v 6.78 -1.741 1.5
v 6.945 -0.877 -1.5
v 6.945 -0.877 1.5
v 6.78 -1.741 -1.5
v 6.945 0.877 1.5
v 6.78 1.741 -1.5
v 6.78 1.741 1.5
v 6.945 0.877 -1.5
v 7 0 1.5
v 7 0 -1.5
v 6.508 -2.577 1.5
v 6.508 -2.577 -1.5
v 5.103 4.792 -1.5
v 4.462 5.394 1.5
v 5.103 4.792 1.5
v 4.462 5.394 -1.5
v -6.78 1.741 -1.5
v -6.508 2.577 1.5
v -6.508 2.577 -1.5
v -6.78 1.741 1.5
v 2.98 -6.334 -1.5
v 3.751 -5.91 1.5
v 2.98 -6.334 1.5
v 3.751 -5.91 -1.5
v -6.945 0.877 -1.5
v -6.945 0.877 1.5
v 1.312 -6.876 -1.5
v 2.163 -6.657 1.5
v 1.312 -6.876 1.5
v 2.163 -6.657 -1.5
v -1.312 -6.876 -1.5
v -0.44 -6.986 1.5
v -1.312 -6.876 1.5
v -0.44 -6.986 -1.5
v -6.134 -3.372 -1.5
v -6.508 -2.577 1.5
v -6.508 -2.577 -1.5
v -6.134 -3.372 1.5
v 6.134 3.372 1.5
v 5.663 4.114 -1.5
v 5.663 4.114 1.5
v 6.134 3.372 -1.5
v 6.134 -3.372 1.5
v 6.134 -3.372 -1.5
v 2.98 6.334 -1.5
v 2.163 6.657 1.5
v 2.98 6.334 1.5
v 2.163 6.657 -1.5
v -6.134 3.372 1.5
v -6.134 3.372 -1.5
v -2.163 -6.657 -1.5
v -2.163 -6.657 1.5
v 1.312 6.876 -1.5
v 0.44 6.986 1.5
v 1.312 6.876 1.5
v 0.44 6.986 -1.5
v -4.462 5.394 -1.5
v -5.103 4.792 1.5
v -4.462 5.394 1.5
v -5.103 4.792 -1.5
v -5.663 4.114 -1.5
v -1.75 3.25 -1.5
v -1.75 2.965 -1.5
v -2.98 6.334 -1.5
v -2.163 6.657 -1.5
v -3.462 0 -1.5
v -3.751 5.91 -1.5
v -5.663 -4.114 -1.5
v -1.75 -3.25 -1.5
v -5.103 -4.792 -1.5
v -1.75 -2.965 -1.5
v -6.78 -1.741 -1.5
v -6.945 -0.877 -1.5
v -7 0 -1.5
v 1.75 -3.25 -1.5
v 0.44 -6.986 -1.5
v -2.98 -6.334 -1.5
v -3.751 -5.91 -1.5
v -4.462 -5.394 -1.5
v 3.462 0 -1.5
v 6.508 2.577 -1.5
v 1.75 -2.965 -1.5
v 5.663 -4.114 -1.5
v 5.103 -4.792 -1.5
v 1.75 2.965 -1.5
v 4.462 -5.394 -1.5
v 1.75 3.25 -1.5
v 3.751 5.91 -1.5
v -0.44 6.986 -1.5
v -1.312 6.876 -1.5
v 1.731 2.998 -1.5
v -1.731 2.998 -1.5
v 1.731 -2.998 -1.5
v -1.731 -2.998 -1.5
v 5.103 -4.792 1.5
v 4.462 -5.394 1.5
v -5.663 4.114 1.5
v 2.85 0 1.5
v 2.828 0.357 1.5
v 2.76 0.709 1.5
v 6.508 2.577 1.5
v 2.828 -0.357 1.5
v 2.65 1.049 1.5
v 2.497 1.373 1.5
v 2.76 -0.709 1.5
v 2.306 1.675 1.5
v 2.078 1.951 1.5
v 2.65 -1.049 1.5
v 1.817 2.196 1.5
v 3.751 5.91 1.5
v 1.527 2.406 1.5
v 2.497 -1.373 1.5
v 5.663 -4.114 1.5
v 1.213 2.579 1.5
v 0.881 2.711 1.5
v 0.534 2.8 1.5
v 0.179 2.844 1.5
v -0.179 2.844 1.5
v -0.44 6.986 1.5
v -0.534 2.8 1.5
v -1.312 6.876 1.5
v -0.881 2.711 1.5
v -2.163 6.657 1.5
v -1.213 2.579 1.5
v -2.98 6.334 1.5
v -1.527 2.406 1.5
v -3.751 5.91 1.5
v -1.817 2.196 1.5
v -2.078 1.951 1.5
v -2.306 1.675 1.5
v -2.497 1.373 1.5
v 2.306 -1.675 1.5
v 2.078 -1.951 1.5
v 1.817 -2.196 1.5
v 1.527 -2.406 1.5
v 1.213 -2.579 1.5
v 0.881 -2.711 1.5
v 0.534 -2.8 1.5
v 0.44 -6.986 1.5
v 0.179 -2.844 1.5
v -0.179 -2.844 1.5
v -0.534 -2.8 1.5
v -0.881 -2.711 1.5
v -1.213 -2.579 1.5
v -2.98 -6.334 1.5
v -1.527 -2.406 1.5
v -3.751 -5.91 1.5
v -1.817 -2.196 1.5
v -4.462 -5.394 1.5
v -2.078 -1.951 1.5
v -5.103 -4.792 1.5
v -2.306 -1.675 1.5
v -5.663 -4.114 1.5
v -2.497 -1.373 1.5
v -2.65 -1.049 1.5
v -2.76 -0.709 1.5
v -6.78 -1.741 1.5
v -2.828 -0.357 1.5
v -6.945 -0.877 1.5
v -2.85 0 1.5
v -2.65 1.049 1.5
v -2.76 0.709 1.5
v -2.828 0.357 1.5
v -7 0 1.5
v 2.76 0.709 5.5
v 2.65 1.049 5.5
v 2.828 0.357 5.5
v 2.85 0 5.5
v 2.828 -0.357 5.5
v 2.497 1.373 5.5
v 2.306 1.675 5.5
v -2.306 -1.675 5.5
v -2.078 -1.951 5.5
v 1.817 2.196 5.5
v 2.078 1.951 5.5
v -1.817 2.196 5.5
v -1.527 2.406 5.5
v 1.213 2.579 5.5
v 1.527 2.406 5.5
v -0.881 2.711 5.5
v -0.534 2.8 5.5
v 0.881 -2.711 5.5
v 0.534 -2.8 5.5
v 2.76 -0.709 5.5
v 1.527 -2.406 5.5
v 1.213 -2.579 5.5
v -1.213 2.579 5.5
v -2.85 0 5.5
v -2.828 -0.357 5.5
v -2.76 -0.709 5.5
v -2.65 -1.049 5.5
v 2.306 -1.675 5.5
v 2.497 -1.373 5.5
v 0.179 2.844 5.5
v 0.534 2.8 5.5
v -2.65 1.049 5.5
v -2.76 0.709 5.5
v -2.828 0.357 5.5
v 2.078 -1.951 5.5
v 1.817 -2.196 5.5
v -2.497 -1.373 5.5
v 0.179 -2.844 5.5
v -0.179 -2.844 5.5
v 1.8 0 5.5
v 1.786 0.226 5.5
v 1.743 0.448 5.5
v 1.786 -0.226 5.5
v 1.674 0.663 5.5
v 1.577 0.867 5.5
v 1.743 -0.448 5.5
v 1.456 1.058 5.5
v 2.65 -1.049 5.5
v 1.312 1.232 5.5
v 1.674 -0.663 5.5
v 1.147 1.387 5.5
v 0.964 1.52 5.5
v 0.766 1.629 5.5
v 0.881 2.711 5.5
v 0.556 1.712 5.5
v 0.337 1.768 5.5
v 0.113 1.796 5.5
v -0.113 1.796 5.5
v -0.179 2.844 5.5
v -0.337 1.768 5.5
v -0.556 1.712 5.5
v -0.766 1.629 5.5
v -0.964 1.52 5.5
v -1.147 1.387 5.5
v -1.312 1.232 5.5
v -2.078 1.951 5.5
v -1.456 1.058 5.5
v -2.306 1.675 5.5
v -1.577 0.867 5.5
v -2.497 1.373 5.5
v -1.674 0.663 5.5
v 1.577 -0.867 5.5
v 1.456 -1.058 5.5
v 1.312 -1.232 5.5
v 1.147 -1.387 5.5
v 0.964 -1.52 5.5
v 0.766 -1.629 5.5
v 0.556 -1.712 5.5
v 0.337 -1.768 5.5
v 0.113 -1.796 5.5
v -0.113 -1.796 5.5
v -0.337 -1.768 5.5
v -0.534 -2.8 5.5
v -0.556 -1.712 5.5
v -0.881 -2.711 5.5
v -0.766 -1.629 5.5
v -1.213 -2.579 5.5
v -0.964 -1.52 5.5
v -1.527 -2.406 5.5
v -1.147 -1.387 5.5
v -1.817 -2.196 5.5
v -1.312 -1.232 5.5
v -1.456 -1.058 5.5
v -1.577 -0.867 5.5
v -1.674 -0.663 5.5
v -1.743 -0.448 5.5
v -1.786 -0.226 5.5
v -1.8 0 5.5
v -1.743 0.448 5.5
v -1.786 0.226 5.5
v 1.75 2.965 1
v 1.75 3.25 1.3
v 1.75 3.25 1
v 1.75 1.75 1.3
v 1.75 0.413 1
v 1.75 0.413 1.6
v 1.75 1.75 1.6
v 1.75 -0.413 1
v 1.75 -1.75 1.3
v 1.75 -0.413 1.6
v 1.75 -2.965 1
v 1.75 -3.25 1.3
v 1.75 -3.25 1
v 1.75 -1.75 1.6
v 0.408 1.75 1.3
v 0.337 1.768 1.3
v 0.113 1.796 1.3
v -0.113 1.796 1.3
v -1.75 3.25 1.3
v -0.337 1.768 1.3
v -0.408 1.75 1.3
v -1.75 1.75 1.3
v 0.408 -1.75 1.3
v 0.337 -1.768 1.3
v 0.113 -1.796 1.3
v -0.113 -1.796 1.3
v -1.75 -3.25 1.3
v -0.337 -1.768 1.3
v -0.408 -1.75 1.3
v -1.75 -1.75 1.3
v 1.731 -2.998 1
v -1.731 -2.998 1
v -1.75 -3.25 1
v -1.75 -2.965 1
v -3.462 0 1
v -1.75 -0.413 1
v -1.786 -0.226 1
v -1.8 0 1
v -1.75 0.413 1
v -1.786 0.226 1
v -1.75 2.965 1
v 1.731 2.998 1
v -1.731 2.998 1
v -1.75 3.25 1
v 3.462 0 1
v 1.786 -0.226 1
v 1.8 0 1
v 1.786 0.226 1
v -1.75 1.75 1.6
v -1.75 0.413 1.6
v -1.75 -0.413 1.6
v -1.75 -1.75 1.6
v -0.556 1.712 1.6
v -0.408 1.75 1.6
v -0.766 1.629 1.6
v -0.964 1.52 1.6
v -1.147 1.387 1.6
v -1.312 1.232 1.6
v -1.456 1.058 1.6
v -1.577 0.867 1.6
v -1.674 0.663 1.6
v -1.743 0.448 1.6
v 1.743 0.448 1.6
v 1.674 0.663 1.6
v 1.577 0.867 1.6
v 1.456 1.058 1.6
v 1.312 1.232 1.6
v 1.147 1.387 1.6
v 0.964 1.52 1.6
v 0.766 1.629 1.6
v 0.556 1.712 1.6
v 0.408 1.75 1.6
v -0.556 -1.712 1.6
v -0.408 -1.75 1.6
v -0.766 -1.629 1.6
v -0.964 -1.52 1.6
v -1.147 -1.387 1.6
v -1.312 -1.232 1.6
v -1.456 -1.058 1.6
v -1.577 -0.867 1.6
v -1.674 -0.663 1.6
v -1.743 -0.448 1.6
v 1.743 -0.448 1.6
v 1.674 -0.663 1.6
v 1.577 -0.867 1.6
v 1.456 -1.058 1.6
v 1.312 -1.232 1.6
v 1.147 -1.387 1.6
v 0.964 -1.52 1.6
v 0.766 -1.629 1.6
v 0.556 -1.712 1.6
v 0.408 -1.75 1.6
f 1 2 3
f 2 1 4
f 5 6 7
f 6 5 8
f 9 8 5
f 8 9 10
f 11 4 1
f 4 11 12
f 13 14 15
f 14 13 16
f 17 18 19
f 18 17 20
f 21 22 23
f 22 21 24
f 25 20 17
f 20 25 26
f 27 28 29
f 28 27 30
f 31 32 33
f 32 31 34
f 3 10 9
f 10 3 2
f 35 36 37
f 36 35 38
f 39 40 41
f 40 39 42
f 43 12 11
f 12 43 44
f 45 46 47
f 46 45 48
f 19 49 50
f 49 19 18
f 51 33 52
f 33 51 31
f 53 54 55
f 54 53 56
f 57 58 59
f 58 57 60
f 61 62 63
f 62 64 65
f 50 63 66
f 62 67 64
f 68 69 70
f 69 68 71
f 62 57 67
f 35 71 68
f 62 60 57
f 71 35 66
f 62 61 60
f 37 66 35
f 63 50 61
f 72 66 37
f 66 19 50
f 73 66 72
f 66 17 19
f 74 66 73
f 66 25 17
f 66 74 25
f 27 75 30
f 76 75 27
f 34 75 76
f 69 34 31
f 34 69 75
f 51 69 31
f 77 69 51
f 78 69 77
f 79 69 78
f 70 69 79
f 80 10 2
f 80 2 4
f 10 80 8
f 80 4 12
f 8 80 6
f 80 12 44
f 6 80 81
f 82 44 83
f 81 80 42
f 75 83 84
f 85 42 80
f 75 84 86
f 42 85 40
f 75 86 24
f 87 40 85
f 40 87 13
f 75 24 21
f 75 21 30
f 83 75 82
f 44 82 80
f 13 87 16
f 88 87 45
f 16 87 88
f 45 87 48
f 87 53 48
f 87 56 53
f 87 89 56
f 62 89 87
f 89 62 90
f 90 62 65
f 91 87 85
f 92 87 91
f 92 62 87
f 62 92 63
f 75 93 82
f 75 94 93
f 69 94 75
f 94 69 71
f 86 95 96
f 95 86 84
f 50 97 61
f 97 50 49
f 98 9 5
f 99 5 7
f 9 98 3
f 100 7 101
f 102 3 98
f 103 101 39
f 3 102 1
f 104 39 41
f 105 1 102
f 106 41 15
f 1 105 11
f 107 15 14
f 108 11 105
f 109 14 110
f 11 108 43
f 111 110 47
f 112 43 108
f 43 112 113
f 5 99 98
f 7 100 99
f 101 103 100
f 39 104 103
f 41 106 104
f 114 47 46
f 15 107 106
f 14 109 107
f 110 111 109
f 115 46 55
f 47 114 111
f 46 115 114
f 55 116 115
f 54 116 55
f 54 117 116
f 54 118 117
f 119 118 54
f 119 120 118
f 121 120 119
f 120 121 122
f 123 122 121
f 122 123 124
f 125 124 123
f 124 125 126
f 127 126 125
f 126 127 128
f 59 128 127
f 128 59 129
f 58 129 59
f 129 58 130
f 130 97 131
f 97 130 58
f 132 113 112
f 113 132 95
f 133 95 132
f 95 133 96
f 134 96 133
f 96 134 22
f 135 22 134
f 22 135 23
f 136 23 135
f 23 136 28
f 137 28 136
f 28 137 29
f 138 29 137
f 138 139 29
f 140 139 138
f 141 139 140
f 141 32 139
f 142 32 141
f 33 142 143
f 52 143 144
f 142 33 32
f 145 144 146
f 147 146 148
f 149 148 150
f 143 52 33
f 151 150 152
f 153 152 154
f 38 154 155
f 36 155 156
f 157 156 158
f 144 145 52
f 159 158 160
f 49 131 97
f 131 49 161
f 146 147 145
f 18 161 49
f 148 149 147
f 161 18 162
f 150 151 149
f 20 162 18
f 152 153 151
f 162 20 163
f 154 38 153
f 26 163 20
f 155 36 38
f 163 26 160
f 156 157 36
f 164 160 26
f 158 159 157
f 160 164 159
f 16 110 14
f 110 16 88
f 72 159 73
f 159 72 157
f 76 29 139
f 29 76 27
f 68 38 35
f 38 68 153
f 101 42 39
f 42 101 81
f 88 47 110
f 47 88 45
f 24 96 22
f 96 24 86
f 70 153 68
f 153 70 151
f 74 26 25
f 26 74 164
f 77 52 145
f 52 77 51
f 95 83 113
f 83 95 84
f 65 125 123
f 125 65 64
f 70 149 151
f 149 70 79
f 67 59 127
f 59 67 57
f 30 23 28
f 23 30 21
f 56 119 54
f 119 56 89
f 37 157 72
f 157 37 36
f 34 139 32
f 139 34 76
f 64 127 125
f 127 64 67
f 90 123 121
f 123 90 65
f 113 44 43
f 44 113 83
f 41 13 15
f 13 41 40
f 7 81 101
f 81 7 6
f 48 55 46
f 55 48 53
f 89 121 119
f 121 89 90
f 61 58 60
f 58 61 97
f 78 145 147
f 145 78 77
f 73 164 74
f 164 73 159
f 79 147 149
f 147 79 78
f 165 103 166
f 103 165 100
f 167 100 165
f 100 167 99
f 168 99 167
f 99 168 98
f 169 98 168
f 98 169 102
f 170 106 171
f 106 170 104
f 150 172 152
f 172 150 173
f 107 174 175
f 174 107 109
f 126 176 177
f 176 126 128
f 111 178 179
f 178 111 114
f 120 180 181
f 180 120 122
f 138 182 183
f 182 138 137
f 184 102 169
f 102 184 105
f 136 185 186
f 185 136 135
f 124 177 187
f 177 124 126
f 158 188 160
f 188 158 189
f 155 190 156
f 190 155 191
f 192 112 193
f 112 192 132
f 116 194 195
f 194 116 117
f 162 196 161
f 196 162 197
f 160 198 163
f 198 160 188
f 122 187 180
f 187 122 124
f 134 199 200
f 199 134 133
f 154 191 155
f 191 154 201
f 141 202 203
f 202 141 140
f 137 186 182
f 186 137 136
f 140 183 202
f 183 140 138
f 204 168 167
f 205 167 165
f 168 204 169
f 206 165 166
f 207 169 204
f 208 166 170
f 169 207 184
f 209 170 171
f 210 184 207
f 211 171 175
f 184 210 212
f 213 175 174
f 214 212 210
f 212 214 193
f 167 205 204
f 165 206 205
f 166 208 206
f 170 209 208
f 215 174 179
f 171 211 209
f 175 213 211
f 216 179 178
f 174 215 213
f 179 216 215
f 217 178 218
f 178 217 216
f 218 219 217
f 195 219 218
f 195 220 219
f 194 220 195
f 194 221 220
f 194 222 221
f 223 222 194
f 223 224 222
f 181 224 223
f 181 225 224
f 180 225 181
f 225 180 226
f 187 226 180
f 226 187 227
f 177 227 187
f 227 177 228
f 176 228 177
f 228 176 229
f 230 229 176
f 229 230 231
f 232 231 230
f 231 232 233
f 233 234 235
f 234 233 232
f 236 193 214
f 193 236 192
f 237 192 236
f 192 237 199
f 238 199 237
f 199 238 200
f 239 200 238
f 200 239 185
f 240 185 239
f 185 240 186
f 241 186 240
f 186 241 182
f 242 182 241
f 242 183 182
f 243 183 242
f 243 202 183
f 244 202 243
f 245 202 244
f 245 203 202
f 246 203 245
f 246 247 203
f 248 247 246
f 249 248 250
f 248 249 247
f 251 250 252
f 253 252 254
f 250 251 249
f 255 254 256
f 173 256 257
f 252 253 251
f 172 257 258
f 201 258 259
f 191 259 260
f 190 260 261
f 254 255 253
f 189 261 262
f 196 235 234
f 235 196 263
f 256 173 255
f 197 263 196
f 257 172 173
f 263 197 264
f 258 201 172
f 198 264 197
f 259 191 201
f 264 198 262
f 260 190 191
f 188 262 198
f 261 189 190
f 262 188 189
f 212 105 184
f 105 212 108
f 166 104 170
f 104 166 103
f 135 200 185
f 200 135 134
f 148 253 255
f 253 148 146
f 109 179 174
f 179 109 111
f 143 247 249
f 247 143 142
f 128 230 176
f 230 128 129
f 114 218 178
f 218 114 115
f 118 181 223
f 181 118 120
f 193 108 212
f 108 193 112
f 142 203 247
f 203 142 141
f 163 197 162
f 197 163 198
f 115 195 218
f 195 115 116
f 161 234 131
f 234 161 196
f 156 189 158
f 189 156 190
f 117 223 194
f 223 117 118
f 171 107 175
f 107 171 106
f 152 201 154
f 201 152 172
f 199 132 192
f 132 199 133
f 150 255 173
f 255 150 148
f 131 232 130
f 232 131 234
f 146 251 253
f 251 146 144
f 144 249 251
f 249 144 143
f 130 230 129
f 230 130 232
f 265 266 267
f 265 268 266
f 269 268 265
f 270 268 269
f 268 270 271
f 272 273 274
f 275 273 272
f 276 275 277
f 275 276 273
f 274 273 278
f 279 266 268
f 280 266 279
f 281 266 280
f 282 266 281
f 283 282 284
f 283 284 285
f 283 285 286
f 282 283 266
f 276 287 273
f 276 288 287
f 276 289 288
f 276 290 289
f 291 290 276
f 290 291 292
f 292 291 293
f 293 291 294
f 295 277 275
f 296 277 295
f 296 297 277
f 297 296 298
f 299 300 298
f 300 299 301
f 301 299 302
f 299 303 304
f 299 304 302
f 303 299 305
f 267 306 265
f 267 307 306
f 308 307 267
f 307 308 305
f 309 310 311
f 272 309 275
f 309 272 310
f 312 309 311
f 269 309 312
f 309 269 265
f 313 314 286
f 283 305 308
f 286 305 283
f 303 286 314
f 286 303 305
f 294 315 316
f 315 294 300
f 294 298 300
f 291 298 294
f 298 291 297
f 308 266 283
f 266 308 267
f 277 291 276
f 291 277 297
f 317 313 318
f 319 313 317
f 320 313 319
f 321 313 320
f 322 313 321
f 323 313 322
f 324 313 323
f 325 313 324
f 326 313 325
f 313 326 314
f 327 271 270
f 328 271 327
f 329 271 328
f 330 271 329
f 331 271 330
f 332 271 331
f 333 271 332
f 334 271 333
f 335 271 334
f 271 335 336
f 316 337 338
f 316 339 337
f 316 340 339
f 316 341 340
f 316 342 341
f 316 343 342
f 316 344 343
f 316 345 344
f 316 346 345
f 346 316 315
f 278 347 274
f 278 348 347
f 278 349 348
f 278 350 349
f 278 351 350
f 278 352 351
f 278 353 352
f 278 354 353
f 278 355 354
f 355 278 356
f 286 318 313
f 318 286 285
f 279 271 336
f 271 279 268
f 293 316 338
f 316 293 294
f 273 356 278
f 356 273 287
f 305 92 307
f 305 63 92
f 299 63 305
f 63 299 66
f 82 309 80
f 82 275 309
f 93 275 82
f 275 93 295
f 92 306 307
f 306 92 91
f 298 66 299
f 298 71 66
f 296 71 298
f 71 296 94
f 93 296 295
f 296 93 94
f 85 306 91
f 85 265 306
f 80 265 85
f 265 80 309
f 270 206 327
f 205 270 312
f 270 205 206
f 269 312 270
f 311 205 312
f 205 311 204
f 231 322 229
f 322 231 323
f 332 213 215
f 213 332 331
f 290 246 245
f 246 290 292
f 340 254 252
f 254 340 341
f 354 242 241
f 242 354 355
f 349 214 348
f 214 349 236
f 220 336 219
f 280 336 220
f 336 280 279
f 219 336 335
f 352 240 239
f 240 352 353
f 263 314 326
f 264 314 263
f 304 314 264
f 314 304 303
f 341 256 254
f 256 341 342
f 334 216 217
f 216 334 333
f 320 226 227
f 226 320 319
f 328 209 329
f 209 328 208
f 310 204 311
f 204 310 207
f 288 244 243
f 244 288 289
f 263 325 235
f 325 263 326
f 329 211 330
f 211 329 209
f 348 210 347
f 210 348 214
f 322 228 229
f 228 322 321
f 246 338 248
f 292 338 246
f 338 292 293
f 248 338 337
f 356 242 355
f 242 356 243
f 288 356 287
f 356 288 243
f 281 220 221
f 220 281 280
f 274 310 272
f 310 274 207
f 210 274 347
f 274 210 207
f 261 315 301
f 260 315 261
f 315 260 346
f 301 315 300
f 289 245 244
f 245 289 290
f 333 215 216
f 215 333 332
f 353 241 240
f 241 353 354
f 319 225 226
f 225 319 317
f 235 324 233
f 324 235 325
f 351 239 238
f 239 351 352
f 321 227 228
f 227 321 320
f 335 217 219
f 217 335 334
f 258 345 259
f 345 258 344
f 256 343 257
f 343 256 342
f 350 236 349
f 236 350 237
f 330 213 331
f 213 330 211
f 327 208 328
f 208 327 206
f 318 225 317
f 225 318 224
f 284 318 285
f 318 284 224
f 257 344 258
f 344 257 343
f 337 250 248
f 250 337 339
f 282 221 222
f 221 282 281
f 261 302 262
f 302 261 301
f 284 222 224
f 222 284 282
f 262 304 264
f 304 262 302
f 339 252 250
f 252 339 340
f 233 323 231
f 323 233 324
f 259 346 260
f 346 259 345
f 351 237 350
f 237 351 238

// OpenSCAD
$fn = 50;


difference() {
	union() {
		translate(v = [0, 0, -1.5000000000]) {
			cylinder(h = 3, r = 7.0000000000);
		}
		translate(v = [0, 0, -1.5000000000]) {
			cylinder(h = 7, r = 2.8500000000);
		}
	}
	union() {
		translate(v = [0, 0, -1.5000000000]) {
			rotate(a = [0, 0, 0]) {
				difference() {
					union() {
						translate(v = [-1.7500000000, -3.2500000000, -0.3000000000]) {
							cube(size = [3.5000000000, 6.5000000000, 0.3000000000]);
						}
						translate(v = [-1.7500000000, -1.7500000000, -0.6000000000]) {
							cube(size = [3.5000000000, 3.5000000000, 0.3000000000]);
						}
						translate(v = [-1.7500000000, -3.2500000000, 2.5000000000]) {
							cube(size = [3.5000000000, 6.5000000000, 0.3000000000]);
						}
						translate(v = [-1.7500000000, -1.7500000000, 2.8000000000]) {
							cube(size = [3.5000000000, 3.5000000000, 0.3000000000]);
						}
						linear_extrude(height = 2.5000000000) {
							polygon(points = [[3.4620000000, 0.0000000000], [1.7310000000, 2.9981799479], [-1.7310000000, 2.9981799479], [-3.4620000000, 0.0000000000], [-1.7310000000, -2.9981799479], [1.7310000000, -2.9981799479]]);
						}
						translate(v = [-1.7500000000, -3.2500000000, -0.3000000000]) {
							cube(size = [3.5000000000, 6.5000000000, 0.3000000000]);
						}
						translate(v = [-1.7500000000, -1.7500000000, -0.6000000000]) {
							cube(size = [3.5000000000, 3.5000000000, 0.3000000000]);
						}
						translate(v = [-1.7500000000, -3.2500000000, 2.5000000000]) {
							cube(size = [3.5000000000, 6.5000000000, 0.3000000000]);
						}
						translate(v = [-1.7500000000, -1.7500000000, 2.8000000000]) {
							cube(size = [3.5000000000, 3.5000000000, 0.3000000000]);
						}
						translate(v = [-1.7500000000, -3.2500000000, -0.3000000000]) {
							cube(size = [3.5000000000, 6.5000000000, 0.3000000000]);
						}
						translate(v = [-1.7500000000, -1.7500000000, -0.6000000000]) {
							cube(size = [3.5000000000, 3.5000000000, 0.3000000000]);
						}
						translate(v = [-1.7500000000, -3.2500000000, 2.5000000000]) {
							cube(size = [3.5000000000, 6.5000000000, 0.3000000000]);
						}
						translate(v = [-1.7500000000, -1.7500000000, 2.8000000000]) {
							cube(size = [3.5000000000, 3.5000000000, 0.3000000000]);
						}
					}
					union();
				}
			}
		}
		translate(v = [0, 0, -100.0000000000]) {
			cylinder(h = 200, r = 1.8000000000);
		}
	}
}
